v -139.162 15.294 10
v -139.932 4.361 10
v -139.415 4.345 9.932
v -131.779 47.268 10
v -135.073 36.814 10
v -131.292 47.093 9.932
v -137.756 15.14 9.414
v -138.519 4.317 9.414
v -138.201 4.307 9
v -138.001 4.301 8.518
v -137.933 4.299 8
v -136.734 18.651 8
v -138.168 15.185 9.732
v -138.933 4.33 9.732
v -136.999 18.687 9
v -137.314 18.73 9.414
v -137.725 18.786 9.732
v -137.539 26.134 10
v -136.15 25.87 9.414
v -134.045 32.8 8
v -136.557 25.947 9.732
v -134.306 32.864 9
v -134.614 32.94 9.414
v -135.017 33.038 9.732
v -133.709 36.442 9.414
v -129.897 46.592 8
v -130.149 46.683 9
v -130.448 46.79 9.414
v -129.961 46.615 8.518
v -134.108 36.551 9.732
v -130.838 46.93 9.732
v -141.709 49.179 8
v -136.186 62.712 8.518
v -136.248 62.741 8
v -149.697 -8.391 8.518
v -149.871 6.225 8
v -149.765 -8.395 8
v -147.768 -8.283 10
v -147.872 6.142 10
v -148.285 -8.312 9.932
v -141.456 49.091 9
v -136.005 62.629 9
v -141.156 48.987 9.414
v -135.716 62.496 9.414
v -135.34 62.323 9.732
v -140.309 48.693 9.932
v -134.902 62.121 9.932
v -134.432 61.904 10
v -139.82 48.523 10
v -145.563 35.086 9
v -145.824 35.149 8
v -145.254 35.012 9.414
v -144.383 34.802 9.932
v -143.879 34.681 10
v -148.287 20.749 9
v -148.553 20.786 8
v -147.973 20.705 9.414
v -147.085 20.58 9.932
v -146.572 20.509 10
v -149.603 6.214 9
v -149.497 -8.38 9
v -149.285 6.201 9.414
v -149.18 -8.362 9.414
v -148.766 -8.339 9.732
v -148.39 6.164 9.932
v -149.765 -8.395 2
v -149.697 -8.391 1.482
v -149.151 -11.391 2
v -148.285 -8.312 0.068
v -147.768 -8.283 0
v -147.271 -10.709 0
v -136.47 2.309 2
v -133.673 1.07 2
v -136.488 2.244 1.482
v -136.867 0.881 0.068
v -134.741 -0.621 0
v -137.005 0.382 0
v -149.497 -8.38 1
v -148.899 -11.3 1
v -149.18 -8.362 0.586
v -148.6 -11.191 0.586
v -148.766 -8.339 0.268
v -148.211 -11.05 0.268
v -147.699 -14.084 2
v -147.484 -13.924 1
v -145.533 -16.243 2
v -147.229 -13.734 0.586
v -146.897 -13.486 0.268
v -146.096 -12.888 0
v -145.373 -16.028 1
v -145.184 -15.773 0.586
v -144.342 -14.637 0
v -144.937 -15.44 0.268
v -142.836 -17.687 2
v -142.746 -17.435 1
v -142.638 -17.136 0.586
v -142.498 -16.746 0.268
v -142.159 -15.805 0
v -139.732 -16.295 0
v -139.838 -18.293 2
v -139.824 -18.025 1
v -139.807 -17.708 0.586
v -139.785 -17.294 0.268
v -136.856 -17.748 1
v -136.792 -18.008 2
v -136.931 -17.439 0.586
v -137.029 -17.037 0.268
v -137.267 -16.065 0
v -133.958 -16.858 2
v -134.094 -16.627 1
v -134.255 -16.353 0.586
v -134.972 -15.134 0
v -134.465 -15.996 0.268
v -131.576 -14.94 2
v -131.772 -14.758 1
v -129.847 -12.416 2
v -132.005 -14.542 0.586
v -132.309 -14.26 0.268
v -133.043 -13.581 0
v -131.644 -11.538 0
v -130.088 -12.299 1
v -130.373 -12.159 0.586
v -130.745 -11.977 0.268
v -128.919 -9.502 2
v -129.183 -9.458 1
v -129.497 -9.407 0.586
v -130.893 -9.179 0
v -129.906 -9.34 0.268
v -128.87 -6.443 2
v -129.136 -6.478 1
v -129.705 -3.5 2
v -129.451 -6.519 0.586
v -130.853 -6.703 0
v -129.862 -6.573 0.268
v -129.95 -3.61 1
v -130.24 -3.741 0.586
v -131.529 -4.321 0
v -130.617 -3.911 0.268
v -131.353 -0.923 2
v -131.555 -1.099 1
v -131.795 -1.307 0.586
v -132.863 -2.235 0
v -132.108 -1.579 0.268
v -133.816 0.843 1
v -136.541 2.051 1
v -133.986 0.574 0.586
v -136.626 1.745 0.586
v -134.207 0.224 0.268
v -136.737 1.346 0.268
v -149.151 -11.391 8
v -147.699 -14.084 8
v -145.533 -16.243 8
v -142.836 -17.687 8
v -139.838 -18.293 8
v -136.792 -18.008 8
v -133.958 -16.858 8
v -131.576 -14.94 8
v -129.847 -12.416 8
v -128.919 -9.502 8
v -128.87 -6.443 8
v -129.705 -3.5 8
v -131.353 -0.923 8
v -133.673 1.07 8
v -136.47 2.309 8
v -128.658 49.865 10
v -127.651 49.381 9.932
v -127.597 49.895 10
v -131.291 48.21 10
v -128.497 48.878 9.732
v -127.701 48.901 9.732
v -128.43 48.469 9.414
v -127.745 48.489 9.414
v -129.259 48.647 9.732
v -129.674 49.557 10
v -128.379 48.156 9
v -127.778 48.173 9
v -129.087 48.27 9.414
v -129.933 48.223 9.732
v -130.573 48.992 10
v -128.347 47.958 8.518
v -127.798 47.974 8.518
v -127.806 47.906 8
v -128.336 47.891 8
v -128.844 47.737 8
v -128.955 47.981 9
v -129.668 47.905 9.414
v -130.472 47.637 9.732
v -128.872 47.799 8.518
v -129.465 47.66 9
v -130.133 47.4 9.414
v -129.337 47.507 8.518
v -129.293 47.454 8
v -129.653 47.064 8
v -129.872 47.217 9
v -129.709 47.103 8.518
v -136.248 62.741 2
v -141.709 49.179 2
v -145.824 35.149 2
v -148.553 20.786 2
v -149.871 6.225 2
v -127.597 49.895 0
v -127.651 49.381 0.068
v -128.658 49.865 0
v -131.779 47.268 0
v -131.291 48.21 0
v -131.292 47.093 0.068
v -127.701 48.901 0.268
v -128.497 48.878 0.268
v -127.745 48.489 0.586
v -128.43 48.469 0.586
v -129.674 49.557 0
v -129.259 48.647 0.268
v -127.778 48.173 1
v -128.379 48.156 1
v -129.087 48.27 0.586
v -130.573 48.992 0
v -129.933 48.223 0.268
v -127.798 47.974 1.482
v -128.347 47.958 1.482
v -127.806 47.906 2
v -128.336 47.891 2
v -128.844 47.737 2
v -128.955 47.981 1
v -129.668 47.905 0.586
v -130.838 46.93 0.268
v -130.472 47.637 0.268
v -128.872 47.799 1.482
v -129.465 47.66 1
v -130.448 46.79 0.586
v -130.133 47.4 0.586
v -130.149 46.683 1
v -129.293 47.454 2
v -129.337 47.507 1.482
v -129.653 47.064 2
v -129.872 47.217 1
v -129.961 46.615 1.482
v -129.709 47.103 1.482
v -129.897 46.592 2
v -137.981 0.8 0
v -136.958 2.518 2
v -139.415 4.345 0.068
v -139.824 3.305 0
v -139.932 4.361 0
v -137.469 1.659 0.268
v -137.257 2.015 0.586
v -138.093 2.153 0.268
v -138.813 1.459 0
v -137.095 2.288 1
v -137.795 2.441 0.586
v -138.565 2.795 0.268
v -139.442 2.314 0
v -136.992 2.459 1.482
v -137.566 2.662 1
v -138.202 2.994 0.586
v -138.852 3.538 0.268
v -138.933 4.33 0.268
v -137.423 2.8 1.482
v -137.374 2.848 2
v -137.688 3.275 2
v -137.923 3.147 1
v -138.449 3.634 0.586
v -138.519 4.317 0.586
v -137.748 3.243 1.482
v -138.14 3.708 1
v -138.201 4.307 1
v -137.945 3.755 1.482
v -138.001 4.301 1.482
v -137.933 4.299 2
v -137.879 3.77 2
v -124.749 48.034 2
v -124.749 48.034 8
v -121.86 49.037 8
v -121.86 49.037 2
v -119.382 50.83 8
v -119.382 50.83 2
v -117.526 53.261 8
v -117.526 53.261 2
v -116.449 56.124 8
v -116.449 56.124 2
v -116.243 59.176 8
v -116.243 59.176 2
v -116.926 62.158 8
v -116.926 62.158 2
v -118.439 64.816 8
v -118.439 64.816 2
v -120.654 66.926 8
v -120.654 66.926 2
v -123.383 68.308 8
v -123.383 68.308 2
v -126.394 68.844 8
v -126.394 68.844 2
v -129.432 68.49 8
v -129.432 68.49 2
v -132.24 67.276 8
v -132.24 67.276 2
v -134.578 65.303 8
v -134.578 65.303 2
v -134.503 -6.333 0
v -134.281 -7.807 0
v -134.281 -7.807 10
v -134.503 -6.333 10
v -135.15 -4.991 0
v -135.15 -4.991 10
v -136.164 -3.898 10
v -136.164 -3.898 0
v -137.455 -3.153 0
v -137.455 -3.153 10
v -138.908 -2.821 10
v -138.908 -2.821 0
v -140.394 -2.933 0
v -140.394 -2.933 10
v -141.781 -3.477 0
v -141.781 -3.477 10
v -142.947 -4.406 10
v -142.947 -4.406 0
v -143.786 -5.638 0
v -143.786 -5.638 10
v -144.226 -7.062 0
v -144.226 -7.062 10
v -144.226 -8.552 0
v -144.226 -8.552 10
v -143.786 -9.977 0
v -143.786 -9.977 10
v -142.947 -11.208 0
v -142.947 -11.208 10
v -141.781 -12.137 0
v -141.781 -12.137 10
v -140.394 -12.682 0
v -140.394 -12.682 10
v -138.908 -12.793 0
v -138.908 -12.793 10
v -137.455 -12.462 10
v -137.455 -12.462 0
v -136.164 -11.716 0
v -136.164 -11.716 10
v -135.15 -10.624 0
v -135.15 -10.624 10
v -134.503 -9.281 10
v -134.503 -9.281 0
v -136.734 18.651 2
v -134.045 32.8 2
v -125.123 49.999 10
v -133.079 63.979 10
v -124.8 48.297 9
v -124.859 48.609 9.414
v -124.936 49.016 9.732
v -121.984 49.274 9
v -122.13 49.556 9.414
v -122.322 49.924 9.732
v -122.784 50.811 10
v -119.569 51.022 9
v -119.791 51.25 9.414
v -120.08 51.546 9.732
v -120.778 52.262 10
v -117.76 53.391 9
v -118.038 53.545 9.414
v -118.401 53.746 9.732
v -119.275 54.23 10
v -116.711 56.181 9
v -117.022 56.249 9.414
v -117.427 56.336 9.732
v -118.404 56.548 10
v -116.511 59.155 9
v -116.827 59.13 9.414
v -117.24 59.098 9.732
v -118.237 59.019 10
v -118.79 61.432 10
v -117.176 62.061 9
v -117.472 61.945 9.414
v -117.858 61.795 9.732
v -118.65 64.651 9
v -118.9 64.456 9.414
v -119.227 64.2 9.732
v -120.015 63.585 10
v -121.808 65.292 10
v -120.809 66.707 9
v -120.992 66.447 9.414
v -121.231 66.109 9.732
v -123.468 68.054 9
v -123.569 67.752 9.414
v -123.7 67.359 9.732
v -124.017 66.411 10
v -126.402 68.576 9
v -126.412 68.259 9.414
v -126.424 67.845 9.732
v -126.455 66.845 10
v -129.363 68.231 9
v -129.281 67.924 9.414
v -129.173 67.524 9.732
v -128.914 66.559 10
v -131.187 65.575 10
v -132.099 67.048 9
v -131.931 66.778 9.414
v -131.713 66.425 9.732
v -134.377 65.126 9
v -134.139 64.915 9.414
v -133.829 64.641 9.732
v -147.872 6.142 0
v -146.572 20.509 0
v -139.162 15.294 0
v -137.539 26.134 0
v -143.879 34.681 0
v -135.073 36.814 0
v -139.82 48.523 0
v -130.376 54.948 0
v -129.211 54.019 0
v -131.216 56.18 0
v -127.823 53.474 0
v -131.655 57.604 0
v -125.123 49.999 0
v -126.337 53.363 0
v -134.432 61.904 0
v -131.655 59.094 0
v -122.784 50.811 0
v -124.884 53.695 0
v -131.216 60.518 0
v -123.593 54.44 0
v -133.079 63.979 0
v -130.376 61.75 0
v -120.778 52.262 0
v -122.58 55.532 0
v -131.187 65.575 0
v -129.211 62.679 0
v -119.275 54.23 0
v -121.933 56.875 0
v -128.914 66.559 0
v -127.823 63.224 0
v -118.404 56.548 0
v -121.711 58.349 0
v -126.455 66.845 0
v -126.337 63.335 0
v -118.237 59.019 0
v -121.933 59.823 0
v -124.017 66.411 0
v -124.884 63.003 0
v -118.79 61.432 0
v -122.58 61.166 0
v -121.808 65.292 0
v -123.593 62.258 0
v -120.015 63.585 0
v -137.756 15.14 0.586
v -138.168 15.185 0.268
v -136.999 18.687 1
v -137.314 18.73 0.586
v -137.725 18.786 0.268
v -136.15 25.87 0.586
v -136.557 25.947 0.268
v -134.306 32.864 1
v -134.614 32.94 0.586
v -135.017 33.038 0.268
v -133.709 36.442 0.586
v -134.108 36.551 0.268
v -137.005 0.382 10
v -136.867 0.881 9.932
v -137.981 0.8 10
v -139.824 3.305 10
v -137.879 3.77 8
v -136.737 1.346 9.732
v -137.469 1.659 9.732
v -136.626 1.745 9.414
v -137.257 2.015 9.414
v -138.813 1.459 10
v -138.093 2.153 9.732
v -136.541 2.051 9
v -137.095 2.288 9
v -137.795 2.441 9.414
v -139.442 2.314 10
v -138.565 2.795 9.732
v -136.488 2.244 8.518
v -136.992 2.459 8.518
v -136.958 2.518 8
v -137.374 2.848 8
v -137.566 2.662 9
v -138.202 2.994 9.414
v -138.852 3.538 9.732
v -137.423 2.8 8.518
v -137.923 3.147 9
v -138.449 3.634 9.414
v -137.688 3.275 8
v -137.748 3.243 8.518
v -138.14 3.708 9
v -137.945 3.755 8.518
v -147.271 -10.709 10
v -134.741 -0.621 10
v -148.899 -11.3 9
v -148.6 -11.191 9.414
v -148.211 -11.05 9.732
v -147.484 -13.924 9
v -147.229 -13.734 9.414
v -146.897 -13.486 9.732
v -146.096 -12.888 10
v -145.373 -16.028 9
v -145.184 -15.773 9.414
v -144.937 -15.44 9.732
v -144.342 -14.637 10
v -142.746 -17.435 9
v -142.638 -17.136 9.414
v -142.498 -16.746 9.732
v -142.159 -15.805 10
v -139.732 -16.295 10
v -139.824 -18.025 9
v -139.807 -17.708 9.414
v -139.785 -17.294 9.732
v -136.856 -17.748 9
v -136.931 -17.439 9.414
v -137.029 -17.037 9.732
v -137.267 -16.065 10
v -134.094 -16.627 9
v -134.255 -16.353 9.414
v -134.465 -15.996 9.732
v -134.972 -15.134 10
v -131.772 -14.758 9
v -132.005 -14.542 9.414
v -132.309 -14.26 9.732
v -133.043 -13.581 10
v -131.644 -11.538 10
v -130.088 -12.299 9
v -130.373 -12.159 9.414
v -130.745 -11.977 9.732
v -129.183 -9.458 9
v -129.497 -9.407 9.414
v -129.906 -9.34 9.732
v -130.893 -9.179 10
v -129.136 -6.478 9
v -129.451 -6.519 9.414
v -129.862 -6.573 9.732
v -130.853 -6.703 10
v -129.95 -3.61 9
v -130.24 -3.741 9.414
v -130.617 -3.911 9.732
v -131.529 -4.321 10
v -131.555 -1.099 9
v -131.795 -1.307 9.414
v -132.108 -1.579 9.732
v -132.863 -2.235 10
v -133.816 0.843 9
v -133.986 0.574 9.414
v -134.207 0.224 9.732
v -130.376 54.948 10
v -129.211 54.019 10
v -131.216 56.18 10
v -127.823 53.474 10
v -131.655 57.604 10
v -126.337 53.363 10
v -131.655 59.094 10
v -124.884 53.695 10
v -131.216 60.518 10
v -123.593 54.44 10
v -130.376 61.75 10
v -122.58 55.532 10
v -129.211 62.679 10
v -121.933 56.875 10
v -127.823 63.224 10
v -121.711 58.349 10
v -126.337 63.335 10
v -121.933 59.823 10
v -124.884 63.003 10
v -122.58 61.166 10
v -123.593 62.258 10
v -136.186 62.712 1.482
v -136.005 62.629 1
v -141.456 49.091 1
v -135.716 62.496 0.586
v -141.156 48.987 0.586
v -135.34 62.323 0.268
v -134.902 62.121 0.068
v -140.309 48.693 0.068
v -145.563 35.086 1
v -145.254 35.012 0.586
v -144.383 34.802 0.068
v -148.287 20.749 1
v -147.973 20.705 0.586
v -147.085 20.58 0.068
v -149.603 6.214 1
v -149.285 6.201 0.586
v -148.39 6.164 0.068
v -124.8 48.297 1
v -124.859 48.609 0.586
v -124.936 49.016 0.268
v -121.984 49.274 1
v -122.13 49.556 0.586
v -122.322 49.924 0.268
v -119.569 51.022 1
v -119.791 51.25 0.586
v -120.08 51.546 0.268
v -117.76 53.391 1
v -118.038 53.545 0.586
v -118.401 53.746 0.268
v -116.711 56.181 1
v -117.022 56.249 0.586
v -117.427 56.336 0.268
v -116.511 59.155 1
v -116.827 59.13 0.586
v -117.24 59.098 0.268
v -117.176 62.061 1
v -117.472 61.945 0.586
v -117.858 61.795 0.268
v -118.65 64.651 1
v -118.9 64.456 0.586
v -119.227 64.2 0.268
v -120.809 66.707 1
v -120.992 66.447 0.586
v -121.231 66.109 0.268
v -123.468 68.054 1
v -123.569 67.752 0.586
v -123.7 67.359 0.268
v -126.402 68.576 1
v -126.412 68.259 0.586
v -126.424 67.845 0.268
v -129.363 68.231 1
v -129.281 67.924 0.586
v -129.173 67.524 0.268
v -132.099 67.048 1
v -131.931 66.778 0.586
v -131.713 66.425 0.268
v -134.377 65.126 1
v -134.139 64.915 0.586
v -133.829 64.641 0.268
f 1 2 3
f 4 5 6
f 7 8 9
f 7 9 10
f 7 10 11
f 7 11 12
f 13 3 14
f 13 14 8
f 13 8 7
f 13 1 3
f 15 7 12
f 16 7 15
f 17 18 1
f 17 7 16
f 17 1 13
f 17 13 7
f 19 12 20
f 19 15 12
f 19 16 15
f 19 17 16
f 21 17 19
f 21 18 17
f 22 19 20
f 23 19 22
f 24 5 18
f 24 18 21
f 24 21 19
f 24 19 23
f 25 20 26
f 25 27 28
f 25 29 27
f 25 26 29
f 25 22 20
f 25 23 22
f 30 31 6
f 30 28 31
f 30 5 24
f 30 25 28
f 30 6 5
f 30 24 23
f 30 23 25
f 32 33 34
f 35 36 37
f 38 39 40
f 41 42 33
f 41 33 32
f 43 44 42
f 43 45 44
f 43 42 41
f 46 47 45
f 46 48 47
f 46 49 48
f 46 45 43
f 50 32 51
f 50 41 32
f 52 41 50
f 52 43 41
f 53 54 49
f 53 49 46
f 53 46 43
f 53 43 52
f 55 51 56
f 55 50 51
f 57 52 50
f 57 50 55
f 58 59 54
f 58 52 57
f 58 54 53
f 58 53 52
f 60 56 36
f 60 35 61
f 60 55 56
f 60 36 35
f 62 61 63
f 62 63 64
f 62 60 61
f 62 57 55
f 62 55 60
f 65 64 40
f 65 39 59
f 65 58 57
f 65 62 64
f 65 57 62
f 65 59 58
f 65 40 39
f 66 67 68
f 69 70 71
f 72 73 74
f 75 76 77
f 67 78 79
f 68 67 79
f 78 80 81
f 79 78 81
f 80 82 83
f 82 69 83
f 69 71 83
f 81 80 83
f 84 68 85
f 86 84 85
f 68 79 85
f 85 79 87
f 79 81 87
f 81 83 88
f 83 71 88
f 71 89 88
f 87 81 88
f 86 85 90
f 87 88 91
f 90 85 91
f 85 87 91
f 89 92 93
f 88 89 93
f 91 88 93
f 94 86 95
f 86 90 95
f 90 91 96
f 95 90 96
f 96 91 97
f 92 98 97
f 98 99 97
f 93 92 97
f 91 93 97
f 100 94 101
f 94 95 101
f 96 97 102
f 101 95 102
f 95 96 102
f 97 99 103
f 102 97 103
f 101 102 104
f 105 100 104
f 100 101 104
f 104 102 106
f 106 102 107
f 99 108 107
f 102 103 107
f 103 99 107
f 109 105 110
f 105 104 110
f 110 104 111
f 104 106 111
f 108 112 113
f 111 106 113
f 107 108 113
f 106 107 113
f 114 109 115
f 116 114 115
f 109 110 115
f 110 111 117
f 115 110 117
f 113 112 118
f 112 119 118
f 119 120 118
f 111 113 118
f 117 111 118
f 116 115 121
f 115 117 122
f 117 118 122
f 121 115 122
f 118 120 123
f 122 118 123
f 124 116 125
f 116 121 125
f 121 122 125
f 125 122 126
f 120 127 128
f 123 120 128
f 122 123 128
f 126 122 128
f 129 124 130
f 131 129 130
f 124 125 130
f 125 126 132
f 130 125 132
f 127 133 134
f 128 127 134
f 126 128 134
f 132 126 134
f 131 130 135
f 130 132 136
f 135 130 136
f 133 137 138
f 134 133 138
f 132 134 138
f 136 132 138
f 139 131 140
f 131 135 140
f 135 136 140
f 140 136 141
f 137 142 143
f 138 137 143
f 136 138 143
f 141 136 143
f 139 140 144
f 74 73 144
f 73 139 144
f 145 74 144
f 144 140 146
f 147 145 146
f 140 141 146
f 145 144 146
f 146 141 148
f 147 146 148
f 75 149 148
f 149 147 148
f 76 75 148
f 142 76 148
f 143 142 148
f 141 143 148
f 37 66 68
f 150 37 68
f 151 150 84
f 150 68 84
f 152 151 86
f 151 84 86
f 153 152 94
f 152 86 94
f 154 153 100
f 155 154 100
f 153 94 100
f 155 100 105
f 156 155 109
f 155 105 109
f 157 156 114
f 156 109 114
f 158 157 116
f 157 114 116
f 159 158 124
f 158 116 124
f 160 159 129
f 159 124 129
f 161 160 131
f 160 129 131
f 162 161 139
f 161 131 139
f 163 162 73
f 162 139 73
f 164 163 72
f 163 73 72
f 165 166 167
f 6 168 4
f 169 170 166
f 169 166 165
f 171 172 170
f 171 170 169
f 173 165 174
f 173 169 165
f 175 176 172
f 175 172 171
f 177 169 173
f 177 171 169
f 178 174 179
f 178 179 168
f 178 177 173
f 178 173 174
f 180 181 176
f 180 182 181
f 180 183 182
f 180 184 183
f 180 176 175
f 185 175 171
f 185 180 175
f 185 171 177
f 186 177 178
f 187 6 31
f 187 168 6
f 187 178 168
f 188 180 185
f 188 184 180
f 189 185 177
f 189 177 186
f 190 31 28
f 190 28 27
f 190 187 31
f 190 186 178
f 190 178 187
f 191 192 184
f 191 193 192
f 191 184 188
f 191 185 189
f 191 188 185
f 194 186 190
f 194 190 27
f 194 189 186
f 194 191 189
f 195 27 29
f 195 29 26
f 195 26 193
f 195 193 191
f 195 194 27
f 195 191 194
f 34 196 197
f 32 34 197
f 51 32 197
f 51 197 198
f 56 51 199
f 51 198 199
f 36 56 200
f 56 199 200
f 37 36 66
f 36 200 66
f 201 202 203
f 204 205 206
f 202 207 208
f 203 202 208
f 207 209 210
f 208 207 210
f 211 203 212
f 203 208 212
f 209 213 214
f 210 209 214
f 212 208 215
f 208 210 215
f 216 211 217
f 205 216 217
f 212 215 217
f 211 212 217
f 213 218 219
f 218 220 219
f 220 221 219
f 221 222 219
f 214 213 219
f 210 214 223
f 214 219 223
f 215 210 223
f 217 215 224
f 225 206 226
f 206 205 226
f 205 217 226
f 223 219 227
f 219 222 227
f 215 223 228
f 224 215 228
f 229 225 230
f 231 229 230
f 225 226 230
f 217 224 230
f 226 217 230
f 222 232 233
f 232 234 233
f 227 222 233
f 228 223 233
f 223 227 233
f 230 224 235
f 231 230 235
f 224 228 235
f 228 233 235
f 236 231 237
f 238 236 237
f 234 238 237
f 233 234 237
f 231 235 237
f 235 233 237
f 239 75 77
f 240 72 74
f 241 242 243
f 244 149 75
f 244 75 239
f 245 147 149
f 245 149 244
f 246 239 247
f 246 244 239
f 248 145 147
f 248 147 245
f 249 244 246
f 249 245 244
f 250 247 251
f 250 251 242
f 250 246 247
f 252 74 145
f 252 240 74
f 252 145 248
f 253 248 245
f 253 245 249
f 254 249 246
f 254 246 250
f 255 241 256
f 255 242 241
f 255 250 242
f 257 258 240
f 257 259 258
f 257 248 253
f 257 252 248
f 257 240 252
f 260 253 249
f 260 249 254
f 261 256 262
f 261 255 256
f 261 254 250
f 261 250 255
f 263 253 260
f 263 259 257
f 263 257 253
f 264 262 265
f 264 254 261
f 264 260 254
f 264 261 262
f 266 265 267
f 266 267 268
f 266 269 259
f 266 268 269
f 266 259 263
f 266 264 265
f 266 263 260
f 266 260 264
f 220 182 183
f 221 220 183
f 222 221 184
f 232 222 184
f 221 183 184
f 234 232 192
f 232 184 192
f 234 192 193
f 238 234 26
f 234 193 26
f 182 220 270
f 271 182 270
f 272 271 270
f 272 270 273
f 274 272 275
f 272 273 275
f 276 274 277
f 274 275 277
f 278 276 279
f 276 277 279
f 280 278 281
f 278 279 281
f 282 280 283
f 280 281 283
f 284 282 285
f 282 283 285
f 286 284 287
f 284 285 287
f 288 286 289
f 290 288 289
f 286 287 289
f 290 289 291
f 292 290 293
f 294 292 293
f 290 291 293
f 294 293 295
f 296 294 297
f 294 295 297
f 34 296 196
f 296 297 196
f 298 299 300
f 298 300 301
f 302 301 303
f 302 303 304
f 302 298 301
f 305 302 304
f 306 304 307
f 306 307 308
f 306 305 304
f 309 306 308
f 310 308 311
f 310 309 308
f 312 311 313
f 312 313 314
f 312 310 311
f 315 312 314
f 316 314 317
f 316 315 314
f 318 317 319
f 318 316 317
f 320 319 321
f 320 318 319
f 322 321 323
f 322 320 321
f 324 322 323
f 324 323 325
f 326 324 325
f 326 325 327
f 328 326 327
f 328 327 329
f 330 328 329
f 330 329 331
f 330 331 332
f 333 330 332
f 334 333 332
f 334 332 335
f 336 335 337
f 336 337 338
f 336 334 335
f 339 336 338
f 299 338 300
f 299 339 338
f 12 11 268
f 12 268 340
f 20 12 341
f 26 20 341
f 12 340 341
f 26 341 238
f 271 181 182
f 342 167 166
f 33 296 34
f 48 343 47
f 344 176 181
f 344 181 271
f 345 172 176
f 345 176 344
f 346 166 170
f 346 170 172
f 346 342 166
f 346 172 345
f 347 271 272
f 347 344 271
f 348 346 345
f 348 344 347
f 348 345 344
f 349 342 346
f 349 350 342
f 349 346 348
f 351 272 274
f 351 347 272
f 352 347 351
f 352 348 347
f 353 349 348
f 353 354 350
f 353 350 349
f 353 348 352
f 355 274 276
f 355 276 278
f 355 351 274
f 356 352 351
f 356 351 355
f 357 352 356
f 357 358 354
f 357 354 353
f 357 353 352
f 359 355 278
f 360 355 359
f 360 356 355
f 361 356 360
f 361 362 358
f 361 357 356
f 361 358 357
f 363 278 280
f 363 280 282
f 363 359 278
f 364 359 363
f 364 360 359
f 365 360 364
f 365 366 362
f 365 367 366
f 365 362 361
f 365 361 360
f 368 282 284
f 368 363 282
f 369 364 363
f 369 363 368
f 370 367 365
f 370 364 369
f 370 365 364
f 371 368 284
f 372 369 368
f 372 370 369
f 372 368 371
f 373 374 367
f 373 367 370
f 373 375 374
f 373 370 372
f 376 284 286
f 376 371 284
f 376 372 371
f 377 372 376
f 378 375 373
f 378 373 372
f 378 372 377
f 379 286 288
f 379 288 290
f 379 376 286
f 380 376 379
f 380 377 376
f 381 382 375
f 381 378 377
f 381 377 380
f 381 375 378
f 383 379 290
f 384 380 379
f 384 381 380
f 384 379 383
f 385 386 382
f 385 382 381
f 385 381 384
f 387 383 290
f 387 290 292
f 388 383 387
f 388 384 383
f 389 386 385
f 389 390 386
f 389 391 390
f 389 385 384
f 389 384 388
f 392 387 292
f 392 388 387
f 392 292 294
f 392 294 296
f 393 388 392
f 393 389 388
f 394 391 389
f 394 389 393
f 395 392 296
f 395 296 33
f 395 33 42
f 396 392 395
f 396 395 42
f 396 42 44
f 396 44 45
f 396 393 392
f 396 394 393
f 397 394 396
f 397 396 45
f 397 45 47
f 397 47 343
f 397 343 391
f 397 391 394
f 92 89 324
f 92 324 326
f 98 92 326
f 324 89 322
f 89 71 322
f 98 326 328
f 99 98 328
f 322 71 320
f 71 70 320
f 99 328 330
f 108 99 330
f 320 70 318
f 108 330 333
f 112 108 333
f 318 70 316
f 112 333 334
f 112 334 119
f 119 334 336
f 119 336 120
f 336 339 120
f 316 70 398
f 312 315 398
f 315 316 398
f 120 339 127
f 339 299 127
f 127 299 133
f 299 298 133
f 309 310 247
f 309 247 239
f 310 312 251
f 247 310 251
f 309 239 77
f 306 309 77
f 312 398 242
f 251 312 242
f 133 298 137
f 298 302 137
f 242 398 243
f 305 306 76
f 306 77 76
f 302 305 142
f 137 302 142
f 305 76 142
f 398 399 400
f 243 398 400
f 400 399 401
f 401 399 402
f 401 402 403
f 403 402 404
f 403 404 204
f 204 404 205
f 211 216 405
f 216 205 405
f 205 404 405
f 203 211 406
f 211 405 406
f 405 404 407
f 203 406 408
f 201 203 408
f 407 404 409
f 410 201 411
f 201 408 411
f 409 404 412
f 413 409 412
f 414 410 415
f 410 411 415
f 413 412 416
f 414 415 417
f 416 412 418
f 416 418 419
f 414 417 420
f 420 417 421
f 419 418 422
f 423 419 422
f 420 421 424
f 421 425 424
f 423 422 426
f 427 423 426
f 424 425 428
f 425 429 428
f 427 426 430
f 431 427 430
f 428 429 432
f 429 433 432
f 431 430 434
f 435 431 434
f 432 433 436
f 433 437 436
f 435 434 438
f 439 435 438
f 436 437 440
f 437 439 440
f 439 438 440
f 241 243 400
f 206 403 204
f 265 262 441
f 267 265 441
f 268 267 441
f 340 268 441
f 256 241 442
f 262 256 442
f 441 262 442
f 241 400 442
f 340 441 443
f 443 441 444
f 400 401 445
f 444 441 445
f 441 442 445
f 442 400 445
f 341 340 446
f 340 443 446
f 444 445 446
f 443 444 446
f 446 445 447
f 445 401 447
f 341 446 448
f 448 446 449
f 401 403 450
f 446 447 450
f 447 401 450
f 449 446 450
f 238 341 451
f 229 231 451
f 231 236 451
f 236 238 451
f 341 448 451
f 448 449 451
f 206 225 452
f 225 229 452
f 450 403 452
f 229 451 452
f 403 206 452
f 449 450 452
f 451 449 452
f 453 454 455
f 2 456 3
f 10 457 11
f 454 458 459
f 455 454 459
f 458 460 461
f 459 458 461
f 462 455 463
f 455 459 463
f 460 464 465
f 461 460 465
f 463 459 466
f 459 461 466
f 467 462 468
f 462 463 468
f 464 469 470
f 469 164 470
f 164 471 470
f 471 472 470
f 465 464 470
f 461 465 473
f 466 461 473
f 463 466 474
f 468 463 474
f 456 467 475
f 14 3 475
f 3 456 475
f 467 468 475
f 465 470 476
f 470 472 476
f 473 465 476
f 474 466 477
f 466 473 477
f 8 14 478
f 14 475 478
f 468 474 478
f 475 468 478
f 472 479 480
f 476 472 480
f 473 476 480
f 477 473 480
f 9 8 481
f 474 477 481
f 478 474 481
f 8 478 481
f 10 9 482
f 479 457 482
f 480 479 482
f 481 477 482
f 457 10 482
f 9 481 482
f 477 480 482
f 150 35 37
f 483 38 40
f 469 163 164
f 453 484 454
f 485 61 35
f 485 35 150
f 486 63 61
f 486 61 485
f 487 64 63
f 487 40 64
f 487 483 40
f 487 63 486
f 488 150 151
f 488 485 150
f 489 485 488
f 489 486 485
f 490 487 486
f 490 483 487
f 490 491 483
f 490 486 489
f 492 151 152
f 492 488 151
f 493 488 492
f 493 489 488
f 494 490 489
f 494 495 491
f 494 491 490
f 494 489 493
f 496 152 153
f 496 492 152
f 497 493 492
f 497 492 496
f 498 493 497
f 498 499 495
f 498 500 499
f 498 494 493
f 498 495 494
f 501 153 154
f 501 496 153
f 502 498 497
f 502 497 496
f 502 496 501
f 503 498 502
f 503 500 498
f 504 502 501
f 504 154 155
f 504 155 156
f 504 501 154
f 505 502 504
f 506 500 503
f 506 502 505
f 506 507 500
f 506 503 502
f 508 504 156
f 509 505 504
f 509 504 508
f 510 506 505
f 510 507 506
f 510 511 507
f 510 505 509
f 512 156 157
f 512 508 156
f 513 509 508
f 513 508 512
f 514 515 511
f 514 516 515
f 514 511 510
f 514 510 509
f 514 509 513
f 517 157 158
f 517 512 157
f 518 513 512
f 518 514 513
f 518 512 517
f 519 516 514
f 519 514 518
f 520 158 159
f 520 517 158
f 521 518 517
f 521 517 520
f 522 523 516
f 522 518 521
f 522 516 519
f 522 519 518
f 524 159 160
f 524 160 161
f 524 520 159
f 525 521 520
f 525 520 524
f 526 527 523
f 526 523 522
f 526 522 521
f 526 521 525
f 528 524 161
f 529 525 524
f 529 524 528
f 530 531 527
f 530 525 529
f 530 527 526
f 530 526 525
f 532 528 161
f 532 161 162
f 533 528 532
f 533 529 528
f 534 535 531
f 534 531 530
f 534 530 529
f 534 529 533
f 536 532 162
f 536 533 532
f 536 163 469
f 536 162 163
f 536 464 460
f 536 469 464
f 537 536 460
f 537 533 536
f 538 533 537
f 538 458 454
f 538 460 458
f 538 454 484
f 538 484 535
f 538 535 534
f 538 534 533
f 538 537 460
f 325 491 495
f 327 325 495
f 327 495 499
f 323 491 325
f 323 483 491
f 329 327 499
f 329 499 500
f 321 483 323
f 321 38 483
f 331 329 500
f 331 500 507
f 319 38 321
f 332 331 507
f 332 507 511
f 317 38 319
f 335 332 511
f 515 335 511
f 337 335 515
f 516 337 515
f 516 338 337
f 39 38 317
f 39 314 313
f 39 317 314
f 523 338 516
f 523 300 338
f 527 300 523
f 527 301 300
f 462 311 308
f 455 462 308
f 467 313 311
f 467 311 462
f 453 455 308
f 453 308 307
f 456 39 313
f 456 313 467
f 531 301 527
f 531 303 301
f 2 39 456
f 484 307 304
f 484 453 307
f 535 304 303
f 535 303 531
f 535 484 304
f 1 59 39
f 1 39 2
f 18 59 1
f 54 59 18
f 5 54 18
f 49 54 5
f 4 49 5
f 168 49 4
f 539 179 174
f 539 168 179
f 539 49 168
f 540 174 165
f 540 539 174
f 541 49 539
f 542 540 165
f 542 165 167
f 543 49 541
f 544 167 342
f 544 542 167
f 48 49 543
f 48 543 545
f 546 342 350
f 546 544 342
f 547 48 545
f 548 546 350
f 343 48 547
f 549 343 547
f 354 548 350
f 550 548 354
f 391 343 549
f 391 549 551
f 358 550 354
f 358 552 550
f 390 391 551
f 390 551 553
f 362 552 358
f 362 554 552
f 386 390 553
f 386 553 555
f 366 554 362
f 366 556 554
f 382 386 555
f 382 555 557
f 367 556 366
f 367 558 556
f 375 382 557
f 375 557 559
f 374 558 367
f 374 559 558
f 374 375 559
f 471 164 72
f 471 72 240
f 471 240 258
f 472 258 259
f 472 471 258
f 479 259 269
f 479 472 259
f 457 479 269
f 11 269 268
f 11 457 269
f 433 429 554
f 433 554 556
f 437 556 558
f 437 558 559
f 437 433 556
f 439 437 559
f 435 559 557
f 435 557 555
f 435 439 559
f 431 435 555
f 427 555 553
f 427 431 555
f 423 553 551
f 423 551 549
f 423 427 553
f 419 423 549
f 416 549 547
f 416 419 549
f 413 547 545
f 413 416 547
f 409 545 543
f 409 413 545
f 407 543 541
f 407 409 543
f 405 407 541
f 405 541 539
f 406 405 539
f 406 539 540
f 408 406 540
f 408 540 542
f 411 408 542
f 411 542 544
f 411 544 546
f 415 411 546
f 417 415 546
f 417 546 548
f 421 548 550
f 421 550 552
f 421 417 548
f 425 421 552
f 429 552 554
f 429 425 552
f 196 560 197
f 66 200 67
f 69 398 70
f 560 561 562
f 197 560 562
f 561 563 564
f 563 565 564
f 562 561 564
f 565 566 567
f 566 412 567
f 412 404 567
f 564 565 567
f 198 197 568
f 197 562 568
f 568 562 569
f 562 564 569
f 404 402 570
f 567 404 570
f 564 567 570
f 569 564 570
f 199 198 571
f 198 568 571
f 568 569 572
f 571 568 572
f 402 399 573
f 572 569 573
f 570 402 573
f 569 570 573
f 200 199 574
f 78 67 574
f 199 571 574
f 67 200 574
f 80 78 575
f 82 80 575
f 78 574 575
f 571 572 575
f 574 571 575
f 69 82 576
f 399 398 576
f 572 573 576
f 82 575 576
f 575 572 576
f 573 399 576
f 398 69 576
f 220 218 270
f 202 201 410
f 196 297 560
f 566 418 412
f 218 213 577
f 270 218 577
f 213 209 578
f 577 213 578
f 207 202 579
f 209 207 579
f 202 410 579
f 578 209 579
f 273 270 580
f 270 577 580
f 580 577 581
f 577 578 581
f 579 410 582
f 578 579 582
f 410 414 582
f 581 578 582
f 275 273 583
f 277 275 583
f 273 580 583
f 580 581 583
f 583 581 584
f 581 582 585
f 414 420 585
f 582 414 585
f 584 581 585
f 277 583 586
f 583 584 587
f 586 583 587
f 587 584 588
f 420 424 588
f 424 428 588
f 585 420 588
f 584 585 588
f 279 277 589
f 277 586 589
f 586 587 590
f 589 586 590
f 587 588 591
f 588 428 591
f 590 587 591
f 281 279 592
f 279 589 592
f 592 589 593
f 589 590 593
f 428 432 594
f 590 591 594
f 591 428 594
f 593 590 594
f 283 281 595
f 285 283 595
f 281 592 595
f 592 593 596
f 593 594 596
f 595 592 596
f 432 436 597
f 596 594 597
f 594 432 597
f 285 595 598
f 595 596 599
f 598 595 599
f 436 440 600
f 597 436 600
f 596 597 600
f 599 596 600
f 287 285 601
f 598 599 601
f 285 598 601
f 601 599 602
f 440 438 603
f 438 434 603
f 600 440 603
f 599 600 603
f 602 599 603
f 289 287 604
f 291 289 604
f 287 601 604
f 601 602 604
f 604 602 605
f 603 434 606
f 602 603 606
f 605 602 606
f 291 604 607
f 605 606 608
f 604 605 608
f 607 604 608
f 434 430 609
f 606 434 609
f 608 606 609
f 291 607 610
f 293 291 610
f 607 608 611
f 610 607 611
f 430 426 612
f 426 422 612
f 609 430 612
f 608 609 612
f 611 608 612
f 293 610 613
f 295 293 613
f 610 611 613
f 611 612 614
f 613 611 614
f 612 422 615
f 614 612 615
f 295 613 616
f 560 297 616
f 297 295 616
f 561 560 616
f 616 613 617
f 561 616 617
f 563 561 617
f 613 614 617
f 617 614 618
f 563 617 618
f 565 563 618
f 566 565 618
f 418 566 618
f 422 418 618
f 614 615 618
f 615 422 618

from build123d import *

# Parameters (mm, degrees)
SKETCH2_R           = 5
BOSS_EXTRUDE1_DEPTH = 10
FILLET1_R           = 2


with BuildPart() as part:
    # Sketch2 → Boss-Extrude1 (new body)
    with BuildSketch(Plane.XY):
        with BuildLine():
            ThreePointArc((-136.248221627, 62.740912517), (-147.363336048, 28.000842642), (-149.764900792, -8.394908626))
            ThreePointArc((-149.764900792, -8.394908626), (-132.116158495, -15.482544811), (-137.975293762, 2.611189609))
            ThreePointArc((-137.975293762, 2.611189609), (-135.574269165, 25.760775231), (-129.317107469, 48.177647472))
            ThreePointArc((-129.317107469, 48.177647472), (-117.229857172, 62.861348354), (-136.248221627, 62.740912517))
        make_face()
        with Locations((-126.710846113, 58.349048641)):
            Circle(SKETCH2_R, mode=Mode.SUBTRACT)
        with Locations((-139.281357736, -7.807265022)):
            Circle(SKETCH2_R, mode=Mode.SUBTRACT)
    extrude(amount=BOSS_EXTRUDE1_DEPTH)

    # Fillet1
    fillet1_edges = [part.edges().sort_by_distance(p)[0] for p in [
        (-147.363336048, 28.000842642, 10),
        (-132.116158495, -15.482544811, 10),
        (-135.574269165, 25.760775231, 10),
        (-132.116158495, -15.482544811, 0),
        (-147.363336048, 28.000842642, 0),
        (-117.229857172, 62.861348354, 0),
        (-135.574269165, 25.760775231, 0),
        (-117.229857172, 62.861348354, 10),
        (-137.975293762, 2.611189609, 5),
        (-129.317107469, 48.177647472, 5),
    ]]
    fillet(fillet1_edges, radius=FILLET1_R)


solid = part.part
